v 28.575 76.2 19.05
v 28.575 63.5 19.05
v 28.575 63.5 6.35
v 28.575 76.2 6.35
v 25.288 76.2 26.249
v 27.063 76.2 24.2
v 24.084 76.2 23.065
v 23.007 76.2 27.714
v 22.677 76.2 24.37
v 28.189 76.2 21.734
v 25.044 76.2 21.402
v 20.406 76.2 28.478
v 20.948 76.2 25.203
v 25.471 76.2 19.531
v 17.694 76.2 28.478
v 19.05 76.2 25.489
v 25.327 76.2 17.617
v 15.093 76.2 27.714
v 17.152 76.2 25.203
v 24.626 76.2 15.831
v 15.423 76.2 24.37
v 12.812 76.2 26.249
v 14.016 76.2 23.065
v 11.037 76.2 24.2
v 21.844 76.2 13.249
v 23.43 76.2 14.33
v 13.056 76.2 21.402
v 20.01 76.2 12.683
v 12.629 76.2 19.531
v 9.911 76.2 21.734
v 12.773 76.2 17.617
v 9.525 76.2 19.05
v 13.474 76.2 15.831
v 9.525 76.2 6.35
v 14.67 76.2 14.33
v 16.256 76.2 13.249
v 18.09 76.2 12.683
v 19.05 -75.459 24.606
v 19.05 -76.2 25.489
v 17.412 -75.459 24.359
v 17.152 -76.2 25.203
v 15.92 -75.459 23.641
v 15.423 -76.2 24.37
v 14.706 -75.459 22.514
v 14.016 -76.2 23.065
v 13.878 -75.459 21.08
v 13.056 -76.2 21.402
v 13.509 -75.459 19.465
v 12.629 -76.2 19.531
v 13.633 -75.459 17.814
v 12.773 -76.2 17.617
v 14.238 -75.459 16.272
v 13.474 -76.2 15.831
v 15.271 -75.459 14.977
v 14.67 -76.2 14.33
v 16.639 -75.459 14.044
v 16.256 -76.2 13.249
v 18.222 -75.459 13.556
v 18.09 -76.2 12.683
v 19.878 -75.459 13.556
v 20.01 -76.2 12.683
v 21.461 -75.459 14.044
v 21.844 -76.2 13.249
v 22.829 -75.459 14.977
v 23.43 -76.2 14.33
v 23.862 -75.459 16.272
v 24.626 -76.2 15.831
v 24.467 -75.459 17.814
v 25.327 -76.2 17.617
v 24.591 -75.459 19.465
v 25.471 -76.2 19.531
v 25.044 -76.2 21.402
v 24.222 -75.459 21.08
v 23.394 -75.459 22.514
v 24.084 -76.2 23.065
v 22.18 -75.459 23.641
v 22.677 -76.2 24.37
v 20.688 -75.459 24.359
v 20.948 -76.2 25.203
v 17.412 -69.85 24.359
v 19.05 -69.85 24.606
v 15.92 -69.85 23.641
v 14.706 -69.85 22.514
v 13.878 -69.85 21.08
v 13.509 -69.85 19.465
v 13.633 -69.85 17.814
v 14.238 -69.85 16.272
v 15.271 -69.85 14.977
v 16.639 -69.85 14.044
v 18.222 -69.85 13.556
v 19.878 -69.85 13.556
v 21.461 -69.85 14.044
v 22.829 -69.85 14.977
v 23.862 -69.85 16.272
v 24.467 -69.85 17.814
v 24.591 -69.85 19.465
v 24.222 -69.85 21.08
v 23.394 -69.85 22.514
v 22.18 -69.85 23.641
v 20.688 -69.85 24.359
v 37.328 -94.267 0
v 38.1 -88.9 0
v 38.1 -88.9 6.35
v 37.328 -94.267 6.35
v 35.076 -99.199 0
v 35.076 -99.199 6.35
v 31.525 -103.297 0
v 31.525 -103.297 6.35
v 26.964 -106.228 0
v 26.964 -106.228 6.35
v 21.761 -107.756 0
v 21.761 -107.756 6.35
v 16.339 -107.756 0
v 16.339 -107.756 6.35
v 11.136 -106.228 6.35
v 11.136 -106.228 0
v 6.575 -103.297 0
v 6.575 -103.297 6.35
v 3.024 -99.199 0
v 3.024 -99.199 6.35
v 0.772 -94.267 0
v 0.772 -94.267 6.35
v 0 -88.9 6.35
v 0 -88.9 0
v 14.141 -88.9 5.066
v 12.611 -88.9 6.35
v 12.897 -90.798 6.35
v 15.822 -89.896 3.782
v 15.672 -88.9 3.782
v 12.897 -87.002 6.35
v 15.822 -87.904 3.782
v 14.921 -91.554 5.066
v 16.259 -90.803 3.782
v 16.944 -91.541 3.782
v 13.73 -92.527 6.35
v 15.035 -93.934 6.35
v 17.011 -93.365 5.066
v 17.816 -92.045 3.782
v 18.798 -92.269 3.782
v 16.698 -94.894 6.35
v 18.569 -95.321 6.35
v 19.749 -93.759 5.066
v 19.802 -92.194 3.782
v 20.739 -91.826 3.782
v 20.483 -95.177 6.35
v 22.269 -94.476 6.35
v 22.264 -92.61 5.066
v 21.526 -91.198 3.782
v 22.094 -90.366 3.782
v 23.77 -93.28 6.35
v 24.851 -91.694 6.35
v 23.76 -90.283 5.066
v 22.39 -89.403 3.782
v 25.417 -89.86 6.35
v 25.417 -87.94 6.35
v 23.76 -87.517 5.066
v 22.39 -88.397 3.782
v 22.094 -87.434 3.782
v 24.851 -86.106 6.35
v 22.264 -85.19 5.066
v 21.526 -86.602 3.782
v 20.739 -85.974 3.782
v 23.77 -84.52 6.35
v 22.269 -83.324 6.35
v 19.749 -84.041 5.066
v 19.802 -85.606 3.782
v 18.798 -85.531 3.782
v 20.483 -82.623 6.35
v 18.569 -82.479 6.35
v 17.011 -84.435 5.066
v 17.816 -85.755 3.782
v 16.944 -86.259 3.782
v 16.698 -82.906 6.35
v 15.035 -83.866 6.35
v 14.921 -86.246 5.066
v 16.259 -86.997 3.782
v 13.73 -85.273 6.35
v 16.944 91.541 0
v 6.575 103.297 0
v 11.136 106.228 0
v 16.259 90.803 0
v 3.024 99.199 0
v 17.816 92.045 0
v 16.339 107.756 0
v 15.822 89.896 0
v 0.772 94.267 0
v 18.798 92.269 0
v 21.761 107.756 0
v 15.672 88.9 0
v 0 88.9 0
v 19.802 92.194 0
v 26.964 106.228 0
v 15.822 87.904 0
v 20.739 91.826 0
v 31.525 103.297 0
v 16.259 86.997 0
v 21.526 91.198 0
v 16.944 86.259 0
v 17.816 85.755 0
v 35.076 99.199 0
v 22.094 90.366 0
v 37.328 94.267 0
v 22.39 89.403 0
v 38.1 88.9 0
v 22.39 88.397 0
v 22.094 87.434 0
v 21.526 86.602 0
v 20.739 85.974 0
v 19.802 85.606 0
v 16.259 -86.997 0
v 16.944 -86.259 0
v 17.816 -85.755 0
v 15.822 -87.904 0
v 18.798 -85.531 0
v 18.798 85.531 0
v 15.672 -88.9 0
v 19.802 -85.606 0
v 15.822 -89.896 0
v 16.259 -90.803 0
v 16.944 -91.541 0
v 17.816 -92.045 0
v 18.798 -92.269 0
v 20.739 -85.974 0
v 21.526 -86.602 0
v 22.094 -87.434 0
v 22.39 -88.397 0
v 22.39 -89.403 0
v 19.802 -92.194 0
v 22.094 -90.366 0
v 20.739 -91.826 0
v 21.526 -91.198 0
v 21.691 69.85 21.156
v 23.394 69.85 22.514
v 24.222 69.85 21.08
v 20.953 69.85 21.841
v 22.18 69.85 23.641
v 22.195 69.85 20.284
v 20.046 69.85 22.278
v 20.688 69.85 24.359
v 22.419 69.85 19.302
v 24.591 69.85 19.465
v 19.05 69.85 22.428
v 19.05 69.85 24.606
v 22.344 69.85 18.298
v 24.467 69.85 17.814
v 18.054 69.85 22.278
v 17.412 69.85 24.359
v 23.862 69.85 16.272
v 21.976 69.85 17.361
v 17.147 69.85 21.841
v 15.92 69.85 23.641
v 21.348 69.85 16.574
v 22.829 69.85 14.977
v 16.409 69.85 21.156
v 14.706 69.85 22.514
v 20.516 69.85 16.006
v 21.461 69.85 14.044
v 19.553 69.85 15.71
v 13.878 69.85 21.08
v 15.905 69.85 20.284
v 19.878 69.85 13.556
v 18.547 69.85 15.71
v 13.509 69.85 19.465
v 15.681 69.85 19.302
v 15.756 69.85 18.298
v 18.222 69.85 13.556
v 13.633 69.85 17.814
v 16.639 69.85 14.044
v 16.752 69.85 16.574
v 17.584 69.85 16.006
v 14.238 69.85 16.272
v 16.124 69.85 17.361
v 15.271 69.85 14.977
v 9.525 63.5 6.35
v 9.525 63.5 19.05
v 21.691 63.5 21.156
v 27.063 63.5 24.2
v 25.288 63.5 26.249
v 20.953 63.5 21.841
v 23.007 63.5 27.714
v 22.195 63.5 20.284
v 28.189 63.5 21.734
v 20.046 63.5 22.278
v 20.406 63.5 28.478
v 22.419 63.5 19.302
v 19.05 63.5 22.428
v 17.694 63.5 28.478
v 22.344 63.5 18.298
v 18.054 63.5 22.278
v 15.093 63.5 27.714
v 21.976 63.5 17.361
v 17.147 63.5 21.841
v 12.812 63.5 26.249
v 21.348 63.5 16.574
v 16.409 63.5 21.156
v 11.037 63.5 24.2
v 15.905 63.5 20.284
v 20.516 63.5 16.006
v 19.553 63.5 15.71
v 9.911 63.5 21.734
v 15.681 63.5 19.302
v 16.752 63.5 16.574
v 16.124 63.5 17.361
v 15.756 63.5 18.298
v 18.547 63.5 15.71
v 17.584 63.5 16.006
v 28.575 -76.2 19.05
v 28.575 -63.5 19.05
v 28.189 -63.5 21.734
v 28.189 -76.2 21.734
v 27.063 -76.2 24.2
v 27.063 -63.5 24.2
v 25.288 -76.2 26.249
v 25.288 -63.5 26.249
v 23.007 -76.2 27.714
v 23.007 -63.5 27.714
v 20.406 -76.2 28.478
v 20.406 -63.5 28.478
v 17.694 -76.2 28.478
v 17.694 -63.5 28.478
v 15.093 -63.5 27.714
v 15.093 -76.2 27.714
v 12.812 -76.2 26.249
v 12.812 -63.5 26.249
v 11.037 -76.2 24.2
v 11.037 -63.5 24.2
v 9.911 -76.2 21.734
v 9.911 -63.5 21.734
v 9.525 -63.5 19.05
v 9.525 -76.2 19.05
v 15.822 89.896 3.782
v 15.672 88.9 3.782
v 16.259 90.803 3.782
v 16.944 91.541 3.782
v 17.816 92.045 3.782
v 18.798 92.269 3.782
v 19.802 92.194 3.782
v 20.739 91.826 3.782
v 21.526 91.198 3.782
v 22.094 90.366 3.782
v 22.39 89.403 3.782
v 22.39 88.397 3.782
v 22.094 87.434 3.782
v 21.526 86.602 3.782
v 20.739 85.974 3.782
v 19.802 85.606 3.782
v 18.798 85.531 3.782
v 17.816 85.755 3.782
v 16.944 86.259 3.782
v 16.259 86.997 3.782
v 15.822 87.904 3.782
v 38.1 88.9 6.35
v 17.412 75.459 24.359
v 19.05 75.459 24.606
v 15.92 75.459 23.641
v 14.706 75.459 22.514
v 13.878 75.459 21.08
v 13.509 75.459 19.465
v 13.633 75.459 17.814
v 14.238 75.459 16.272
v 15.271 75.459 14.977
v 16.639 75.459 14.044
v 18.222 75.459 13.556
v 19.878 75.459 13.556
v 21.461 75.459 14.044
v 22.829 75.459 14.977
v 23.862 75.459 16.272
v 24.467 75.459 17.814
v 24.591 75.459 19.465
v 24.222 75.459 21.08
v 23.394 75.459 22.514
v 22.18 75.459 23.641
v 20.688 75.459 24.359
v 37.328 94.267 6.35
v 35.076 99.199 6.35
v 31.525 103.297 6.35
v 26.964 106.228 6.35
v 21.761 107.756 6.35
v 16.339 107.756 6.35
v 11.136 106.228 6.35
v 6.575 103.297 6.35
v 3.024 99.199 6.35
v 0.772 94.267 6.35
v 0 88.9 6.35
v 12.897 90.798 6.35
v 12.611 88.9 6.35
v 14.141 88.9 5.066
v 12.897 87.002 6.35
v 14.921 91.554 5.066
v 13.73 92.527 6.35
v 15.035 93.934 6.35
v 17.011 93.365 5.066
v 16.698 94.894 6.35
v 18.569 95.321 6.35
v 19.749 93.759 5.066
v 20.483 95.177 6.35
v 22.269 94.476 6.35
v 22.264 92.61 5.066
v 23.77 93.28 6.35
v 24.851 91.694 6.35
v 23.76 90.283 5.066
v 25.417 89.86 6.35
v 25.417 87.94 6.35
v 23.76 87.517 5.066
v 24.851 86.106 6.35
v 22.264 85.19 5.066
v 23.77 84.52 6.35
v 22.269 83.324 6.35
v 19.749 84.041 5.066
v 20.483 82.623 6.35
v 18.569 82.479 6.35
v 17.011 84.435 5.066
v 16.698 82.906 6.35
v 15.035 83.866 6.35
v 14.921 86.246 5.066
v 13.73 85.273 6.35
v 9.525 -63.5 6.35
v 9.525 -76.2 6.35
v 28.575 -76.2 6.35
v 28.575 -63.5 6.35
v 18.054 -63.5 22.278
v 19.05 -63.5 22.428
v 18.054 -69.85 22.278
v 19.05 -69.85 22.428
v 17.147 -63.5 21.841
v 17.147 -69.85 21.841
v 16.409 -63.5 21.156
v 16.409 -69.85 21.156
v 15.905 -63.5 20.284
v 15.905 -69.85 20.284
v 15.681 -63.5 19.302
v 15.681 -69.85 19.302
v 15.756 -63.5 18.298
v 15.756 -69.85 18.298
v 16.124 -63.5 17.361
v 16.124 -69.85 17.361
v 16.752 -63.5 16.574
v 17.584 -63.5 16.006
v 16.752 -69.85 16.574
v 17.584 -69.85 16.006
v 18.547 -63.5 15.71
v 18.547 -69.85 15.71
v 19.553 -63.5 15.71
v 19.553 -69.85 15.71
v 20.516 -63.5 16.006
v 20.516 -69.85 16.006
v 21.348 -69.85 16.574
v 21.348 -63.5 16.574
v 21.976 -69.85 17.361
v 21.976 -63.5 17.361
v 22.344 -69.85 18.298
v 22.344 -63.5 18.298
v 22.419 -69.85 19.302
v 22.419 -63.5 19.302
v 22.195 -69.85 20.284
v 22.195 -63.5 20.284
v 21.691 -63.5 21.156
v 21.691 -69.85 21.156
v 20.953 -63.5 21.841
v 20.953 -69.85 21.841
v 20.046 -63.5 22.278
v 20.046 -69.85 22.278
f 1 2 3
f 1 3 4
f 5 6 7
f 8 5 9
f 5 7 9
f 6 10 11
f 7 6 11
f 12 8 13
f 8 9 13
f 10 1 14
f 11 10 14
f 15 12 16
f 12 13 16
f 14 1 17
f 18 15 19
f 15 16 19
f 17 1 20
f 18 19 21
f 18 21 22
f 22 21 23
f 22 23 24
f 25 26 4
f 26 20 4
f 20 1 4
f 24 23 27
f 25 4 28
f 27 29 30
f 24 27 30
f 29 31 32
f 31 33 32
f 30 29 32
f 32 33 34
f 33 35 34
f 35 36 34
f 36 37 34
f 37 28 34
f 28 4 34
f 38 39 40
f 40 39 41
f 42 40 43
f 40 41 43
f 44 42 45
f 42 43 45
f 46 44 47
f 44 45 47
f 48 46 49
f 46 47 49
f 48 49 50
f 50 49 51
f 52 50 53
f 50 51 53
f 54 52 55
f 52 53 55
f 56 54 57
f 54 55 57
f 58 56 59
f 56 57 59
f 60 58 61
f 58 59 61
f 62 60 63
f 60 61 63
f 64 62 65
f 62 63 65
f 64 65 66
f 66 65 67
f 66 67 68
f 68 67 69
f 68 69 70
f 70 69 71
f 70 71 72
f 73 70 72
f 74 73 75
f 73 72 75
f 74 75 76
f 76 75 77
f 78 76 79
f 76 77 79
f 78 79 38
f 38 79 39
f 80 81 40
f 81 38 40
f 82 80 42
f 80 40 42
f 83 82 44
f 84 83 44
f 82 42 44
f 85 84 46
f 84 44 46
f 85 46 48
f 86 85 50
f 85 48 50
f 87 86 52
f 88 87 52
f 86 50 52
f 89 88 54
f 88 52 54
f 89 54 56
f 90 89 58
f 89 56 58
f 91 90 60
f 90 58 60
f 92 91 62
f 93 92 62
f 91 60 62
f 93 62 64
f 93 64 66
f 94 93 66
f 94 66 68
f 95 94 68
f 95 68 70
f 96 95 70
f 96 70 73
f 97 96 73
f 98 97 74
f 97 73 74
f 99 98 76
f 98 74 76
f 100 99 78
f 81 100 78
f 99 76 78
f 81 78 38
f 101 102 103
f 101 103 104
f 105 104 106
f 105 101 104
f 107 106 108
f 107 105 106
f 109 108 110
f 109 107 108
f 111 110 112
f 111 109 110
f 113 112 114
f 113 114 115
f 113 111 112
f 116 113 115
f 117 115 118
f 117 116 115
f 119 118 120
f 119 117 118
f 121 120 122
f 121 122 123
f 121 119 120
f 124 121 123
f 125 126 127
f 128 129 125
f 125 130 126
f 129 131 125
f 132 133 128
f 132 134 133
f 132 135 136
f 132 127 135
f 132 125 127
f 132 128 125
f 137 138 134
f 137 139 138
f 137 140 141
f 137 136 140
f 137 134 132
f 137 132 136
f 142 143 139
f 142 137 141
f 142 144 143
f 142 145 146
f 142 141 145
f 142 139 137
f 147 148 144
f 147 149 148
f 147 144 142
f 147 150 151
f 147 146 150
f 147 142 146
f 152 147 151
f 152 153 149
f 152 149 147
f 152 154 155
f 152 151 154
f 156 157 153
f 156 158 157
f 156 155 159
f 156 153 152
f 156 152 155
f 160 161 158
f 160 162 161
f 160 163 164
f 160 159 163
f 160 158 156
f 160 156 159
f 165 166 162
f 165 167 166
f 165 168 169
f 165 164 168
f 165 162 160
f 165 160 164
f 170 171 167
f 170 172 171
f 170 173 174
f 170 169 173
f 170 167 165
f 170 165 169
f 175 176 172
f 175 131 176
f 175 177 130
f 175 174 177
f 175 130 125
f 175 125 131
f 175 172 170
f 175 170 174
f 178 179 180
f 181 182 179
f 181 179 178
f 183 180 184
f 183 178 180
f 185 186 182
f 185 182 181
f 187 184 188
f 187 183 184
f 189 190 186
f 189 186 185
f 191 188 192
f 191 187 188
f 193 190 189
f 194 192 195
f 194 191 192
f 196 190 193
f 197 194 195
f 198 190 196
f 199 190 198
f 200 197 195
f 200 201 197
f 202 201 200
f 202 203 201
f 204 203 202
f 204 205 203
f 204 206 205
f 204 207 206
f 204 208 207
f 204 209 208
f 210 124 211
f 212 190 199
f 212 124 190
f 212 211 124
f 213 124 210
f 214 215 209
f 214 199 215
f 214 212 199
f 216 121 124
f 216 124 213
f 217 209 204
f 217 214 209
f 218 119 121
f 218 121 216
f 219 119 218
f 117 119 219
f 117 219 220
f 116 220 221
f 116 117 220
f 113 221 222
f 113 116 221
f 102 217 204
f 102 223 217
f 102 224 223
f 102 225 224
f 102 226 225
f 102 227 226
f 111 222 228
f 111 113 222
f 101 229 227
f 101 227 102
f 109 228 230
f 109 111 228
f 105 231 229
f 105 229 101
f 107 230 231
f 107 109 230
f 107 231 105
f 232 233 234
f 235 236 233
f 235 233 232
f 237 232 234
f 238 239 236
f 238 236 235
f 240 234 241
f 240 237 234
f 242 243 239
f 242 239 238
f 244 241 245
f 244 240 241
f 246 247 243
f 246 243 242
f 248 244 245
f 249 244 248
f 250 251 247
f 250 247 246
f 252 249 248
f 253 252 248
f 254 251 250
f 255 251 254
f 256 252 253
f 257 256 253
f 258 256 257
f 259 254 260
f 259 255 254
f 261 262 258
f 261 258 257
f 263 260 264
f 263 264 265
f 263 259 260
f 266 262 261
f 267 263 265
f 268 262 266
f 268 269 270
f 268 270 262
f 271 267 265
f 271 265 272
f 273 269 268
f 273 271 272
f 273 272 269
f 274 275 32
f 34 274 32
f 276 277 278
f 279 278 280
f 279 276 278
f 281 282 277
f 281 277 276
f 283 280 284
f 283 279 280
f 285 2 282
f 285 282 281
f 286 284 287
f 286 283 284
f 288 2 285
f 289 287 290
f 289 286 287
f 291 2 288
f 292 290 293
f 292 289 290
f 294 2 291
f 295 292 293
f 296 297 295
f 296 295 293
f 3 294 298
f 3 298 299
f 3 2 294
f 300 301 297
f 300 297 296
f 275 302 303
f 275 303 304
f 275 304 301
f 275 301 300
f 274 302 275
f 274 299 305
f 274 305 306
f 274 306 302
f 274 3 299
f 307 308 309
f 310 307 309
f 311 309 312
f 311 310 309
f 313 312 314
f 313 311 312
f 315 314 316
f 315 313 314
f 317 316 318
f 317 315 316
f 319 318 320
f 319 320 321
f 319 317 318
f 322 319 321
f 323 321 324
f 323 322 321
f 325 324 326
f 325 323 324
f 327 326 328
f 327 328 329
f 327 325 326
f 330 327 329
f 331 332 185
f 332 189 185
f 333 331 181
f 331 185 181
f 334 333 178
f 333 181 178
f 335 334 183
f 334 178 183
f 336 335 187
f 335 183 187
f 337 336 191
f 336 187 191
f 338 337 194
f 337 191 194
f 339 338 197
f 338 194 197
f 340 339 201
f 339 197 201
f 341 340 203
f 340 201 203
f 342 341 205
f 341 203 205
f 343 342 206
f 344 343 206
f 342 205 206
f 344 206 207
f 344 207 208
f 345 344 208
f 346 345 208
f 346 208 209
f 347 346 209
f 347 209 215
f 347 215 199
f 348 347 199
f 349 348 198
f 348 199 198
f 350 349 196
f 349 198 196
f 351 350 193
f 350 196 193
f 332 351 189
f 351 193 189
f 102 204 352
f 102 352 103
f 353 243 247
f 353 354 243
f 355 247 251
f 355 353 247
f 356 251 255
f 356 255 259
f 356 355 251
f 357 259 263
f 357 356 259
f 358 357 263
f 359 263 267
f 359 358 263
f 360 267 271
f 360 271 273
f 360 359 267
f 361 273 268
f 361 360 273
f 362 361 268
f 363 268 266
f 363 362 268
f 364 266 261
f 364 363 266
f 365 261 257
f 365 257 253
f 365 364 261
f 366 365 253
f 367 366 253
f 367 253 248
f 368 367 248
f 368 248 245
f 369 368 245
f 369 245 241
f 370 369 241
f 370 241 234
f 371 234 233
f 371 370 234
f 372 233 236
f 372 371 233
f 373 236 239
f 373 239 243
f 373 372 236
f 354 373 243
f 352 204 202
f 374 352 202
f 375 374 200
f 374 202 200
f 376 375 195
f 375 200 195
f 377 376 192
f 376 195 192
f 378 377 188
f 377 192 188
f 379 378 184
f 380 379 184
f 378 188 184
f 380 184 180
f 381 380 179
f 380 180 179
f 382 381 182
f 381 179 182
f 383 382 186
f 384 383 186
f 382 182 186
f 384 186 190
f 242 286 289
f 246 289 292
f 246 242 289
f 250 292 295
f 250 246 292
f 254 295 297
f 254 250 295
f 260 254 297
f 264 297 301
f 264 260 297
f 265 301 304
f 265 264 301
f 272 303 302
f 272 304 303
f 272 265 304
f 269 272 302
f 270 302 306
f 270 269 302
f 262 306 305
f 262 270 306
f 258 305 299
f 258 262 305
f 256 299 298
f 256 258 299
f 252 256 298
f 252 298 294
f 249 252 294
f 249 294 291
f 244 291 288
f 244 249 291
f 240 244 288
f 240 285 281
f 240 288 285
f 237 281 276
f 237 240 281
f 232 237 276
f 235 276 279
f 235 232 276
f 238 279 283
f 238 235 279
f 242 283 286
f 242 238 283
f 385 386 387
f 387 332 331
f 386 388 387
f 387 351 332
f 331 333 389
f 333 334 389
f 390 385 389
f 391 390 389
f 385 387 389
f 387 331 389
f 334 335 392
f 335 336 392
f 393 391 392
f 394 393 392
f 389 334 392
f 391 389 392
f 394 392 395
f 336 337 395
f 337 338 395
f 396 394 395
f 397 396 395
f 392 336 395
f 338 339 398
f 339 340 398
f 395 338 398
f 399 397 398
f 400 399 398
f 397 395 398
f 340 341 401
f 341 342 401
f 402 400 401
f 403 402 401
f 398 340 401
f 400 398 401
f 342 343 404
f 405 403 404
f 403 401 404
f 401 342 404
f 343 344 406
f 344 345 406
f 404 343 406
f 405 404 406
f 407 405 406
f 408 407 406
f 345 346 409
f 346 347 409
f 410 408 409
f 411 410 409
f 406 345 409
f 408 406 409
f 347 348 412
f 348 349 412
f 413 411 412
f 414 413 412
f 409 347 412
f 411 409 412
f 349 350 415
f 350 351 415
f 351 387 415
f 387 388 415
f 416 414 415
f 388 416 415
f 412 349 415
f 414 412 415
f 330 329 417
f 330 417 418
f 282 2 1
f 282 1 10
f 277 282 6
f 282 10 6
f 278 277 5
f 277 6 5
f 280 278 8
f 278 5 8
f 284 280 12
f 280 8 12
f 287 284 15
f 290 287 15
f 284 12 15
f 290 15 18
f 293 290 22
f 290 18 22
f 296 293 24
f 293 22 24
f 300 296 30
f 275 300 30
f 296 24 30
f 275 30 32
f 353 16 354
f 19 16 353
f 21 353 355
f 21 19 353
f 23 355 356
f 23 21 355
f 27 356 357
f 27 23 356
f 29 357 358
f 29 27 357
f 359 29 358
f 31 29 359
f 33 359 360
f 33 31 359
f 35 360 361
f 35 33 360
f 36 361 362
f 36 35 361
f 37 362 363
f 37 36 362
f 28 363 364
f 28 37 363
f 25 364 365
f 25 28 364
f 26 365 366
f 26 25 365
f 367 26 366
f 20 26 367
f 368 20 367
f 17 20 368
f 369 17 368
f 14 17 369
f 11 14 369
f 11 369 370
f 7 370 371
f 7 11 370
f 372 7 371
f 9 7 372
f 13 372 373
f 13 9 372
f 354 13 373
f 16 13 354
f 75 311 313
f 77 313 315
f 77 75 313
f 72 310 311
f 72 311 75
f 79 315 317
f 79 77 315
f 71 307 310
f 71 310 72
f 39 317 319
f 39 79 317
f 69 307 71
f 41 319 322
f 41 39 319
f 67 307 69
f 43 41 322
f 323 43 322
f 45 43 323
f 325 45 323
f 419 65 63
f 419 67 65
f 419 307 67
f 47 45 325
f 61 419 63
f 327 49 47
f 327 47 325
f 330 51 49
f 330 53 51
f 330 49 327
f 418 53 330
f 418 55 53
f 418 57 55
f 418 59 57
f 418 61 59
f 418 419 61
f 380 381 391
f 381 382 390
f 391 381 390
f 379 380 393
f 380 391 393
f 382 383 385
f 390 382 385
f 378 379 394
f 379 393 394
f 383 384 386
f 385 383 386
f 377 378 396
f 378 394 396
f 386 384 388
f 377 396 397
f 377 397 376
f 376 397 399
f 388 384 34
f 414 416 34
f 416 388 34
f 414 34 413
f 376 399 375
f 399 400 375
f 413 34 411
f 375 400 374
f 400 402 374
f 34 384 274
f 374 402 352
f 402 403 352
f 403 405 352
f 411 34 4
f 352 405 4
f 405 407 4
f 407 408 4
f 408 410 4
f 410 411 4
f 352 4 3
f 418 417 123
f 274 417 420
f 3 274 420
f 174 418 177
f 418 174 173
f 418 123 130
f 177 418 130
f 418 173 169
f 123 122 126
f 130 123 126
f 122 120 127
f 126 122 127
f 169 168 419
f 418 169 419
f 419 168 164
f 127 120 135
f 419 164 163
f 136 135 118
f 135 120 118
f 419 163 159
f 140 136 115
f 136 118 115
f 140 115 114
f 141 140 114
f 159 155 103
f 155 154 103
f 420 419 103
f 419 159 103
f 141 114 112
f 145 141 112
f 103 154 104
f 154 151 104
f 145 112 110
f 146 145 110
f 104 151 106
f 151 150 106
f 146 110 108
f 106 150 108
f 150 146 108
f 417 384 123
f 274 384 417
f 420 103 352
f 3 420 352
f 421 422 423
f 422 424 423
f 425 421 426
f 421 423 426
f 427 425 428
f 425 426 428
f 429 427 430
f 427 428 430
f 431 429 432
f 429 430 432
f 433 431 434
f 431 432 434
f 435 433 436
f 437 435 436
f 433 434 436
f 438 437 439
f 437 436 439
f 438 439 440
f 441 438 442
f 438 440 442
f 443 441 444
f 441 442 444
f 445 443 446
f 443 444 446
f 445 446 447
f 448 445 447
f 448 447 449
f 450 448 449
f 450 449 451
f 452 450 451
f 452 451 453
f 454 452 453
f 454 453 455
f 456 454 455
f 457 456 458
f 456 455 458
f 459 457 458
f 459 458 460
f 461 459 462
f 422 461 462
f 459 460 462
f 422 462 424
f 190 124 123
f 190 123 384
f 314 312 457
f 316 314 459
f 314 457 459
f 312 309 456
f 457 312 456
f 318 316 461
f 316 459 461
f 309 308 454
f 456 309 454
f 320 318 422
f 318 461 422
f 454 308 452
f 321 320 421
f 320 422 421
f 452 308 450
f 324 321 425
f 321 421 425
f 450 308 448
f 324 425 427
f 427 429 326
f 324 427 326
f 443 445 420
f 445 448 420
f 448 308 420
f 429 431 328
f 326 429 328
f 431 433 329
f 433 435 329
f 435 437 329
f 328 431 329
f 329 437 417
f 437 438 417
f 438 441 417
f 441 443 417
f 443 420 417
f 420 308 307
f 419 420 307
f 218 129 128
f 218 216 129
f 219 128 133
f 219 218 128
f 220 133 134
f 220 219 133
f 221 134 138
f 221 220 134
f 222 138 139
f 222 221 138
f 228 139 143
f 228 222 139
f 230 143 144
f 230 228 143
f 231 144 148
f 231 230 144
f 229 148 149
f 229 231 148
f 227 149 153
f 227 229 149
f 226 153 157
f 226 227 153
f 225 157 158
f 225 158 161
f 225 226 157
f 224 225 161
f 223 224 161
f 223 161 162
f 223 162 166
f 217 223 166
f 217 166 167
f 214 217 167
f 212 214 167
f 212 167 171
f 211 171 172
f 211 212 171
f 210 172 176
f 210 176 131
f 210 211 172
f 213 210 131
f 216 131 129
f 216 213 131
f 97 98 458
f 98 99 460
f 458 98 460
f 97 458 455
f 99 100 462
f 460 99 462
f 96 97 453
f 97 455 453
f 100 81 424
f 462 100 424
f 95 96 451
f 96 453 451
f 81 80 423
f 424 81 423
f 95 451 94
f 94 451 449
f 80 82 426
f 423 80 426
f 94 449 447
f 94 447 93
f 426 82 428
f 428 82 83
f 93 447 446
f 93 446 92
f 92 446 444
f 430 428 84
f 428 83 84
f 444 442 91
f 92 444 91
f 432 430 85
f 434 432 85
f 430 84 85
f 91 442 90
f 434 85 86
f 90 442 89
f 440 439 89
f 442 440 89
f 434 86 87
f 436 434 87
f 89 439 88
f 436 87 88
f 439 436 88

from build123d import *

# Parameters (mm, degrees)
BOSS_EXTRUDE1_DEPTH                                 = 6.35
CSK_FOR_1_4_FLAT_HEAD_MACHINE_SCREW_100_D           = 6.7564
CSK_FOR_1_4_FLAT_HEAD_MACHINE_SCREW_100_CSINK_D     = 12.8778
CSK_FOR_1_4_FLAT_HEAD_MACHINE_SCREW_100_CSINK_ANGLE = 100
SKETCH4_W                                           = 19.05
SKETCH4_H                                           = 12.7
BOSS_EXTRUDE2_DEPTH                                 = 12.7
BOSS_EXTRUDE4_DEPTH                                 = 12.7


with BuildPart() as part:
    # Sketch1 → Boss-Extrude1 (new body)
    with BuildSketch(Plane.XY):
        with BuildLine():
            Line((0, 0), (38.1, 0))
            Line((38.1, 0), (38.1, 88.9))
            ThreePointArc((38.1, 88.9), (19.05, 107.95), (0, 88.9))
            Line((0, 88.9), (0, 0))
        make_face()
    boss_extrude1 = extrude(amount=BOSS_EXTRUDE1_DEPTH)

    # CSK for 1/4 Flat Head Machine Screw (100)1 (through all)
    with Locations(Plane.XY.offset(6.35)):
        with Locations((19.05, 88.9)):
            csk_for_1_4_flat_head_machine_screw_100 = CounterSinkHole(CSK_FOR_1_4_FLAT_HEAD_MACHINE_SCREW_100_D / 2, CSK_FOR_1_4_FLAT_HEAD_MACHINE_SCREW_100_CSINK_D / 2, counter_sink_angle=CSK_FOR_1_4_FLAT_HEAD_MACHINE_SCREW_100_CSINK_ANGLE)

    # Sketch4 → Boss-Extrude2 (add)
    with BuildSketch(Plane.XY.offset(6.35)):
        with Locations((19.05, 69.85)):
            Rectangle(SKETCH4_W, SKETCH4_H)
    boss_extrude2 = extrude(amount=BOSS_EXTRUDE2_DEPTH)

    # Sketch12 → Boss-Extrude4 (add)
    with BuildSketch(Plane(origin=(0, 76.2, 0), x_dir=(1, 0, 0), z_dir=(0, 1, 0))):
        with BuildLine():
            Line((9.525, -19.05), (28.575, -19.05))
            ThreePointArc((28.575, -19.05), (19.05, -28.575), (9.525, -19.05))
        make_face()
    boss_extrude4 = extrude(amount=-BOSS_EXTRUDE4_DEPTH)

    # Sketch14 → CBORE for 1/4 Socket Head Cap Screw1 (revolve, cut)
    with BuildSketch(Plane(origin=(19.05, 76.2, 19.05), x_dir=(0, 0, 1), z_dir=(1, 0, 0))):
        Polygon((0, 0), (0, 141.728827343), (3.3782, 139.699), (3.3782, 6.35), (5.55625, 6.35), (5.55625, 0.740631289), (6.4389, 0), align=None)
    cbore_for_1_4_socket_head_cap_screw1 = revolve(axis=Axis((19.05, 82.55, 19.05), (0, -1, 0)), mode=Mode.SUBTRACT)

    # Mirror3: Boss-Extrude1, CSK for 1/4 Flat Head Machine Screw (100)1, Boss-Extrude2, Boss-Extrude4, CBORE for 1/4 Socket Head Cap Screw1 across plane
    add(boss_extrude1.mirror(Plane(origin=(0, 0, 6.35), x_dir=(0, 0, 1), z_dir=(0, 1, 0))))
    add(csk_for_1_4_flat_head_machine_screw_100.mirror(Plane(origin=(0, 0, 6.35), x_dir=(0, 0, 1), z_dir=(0, 1, 0))), mode=Mode.SUBTRACT)
    add(boss_extrude2.mirror(Plane(origin=(0, 0, 6.35), x_dir=(0, 0, 1), z_dir=(0, 1, 0))))
    add(boss_extrude4.mirror(Plane(origin=(0, 0, 6.35), x_dir=(0, 0, 1), z_dir=(0, 1, 0))))
    add(cbore_for_1_4_socket_head_cap_screw1.mirror(Plane(origin=(0, 0, 6.35), x_dir=(0, 0, 1), z_dir=(0, 1, 0))), mode=Mode.SUBTRACT)


solid = part.part
